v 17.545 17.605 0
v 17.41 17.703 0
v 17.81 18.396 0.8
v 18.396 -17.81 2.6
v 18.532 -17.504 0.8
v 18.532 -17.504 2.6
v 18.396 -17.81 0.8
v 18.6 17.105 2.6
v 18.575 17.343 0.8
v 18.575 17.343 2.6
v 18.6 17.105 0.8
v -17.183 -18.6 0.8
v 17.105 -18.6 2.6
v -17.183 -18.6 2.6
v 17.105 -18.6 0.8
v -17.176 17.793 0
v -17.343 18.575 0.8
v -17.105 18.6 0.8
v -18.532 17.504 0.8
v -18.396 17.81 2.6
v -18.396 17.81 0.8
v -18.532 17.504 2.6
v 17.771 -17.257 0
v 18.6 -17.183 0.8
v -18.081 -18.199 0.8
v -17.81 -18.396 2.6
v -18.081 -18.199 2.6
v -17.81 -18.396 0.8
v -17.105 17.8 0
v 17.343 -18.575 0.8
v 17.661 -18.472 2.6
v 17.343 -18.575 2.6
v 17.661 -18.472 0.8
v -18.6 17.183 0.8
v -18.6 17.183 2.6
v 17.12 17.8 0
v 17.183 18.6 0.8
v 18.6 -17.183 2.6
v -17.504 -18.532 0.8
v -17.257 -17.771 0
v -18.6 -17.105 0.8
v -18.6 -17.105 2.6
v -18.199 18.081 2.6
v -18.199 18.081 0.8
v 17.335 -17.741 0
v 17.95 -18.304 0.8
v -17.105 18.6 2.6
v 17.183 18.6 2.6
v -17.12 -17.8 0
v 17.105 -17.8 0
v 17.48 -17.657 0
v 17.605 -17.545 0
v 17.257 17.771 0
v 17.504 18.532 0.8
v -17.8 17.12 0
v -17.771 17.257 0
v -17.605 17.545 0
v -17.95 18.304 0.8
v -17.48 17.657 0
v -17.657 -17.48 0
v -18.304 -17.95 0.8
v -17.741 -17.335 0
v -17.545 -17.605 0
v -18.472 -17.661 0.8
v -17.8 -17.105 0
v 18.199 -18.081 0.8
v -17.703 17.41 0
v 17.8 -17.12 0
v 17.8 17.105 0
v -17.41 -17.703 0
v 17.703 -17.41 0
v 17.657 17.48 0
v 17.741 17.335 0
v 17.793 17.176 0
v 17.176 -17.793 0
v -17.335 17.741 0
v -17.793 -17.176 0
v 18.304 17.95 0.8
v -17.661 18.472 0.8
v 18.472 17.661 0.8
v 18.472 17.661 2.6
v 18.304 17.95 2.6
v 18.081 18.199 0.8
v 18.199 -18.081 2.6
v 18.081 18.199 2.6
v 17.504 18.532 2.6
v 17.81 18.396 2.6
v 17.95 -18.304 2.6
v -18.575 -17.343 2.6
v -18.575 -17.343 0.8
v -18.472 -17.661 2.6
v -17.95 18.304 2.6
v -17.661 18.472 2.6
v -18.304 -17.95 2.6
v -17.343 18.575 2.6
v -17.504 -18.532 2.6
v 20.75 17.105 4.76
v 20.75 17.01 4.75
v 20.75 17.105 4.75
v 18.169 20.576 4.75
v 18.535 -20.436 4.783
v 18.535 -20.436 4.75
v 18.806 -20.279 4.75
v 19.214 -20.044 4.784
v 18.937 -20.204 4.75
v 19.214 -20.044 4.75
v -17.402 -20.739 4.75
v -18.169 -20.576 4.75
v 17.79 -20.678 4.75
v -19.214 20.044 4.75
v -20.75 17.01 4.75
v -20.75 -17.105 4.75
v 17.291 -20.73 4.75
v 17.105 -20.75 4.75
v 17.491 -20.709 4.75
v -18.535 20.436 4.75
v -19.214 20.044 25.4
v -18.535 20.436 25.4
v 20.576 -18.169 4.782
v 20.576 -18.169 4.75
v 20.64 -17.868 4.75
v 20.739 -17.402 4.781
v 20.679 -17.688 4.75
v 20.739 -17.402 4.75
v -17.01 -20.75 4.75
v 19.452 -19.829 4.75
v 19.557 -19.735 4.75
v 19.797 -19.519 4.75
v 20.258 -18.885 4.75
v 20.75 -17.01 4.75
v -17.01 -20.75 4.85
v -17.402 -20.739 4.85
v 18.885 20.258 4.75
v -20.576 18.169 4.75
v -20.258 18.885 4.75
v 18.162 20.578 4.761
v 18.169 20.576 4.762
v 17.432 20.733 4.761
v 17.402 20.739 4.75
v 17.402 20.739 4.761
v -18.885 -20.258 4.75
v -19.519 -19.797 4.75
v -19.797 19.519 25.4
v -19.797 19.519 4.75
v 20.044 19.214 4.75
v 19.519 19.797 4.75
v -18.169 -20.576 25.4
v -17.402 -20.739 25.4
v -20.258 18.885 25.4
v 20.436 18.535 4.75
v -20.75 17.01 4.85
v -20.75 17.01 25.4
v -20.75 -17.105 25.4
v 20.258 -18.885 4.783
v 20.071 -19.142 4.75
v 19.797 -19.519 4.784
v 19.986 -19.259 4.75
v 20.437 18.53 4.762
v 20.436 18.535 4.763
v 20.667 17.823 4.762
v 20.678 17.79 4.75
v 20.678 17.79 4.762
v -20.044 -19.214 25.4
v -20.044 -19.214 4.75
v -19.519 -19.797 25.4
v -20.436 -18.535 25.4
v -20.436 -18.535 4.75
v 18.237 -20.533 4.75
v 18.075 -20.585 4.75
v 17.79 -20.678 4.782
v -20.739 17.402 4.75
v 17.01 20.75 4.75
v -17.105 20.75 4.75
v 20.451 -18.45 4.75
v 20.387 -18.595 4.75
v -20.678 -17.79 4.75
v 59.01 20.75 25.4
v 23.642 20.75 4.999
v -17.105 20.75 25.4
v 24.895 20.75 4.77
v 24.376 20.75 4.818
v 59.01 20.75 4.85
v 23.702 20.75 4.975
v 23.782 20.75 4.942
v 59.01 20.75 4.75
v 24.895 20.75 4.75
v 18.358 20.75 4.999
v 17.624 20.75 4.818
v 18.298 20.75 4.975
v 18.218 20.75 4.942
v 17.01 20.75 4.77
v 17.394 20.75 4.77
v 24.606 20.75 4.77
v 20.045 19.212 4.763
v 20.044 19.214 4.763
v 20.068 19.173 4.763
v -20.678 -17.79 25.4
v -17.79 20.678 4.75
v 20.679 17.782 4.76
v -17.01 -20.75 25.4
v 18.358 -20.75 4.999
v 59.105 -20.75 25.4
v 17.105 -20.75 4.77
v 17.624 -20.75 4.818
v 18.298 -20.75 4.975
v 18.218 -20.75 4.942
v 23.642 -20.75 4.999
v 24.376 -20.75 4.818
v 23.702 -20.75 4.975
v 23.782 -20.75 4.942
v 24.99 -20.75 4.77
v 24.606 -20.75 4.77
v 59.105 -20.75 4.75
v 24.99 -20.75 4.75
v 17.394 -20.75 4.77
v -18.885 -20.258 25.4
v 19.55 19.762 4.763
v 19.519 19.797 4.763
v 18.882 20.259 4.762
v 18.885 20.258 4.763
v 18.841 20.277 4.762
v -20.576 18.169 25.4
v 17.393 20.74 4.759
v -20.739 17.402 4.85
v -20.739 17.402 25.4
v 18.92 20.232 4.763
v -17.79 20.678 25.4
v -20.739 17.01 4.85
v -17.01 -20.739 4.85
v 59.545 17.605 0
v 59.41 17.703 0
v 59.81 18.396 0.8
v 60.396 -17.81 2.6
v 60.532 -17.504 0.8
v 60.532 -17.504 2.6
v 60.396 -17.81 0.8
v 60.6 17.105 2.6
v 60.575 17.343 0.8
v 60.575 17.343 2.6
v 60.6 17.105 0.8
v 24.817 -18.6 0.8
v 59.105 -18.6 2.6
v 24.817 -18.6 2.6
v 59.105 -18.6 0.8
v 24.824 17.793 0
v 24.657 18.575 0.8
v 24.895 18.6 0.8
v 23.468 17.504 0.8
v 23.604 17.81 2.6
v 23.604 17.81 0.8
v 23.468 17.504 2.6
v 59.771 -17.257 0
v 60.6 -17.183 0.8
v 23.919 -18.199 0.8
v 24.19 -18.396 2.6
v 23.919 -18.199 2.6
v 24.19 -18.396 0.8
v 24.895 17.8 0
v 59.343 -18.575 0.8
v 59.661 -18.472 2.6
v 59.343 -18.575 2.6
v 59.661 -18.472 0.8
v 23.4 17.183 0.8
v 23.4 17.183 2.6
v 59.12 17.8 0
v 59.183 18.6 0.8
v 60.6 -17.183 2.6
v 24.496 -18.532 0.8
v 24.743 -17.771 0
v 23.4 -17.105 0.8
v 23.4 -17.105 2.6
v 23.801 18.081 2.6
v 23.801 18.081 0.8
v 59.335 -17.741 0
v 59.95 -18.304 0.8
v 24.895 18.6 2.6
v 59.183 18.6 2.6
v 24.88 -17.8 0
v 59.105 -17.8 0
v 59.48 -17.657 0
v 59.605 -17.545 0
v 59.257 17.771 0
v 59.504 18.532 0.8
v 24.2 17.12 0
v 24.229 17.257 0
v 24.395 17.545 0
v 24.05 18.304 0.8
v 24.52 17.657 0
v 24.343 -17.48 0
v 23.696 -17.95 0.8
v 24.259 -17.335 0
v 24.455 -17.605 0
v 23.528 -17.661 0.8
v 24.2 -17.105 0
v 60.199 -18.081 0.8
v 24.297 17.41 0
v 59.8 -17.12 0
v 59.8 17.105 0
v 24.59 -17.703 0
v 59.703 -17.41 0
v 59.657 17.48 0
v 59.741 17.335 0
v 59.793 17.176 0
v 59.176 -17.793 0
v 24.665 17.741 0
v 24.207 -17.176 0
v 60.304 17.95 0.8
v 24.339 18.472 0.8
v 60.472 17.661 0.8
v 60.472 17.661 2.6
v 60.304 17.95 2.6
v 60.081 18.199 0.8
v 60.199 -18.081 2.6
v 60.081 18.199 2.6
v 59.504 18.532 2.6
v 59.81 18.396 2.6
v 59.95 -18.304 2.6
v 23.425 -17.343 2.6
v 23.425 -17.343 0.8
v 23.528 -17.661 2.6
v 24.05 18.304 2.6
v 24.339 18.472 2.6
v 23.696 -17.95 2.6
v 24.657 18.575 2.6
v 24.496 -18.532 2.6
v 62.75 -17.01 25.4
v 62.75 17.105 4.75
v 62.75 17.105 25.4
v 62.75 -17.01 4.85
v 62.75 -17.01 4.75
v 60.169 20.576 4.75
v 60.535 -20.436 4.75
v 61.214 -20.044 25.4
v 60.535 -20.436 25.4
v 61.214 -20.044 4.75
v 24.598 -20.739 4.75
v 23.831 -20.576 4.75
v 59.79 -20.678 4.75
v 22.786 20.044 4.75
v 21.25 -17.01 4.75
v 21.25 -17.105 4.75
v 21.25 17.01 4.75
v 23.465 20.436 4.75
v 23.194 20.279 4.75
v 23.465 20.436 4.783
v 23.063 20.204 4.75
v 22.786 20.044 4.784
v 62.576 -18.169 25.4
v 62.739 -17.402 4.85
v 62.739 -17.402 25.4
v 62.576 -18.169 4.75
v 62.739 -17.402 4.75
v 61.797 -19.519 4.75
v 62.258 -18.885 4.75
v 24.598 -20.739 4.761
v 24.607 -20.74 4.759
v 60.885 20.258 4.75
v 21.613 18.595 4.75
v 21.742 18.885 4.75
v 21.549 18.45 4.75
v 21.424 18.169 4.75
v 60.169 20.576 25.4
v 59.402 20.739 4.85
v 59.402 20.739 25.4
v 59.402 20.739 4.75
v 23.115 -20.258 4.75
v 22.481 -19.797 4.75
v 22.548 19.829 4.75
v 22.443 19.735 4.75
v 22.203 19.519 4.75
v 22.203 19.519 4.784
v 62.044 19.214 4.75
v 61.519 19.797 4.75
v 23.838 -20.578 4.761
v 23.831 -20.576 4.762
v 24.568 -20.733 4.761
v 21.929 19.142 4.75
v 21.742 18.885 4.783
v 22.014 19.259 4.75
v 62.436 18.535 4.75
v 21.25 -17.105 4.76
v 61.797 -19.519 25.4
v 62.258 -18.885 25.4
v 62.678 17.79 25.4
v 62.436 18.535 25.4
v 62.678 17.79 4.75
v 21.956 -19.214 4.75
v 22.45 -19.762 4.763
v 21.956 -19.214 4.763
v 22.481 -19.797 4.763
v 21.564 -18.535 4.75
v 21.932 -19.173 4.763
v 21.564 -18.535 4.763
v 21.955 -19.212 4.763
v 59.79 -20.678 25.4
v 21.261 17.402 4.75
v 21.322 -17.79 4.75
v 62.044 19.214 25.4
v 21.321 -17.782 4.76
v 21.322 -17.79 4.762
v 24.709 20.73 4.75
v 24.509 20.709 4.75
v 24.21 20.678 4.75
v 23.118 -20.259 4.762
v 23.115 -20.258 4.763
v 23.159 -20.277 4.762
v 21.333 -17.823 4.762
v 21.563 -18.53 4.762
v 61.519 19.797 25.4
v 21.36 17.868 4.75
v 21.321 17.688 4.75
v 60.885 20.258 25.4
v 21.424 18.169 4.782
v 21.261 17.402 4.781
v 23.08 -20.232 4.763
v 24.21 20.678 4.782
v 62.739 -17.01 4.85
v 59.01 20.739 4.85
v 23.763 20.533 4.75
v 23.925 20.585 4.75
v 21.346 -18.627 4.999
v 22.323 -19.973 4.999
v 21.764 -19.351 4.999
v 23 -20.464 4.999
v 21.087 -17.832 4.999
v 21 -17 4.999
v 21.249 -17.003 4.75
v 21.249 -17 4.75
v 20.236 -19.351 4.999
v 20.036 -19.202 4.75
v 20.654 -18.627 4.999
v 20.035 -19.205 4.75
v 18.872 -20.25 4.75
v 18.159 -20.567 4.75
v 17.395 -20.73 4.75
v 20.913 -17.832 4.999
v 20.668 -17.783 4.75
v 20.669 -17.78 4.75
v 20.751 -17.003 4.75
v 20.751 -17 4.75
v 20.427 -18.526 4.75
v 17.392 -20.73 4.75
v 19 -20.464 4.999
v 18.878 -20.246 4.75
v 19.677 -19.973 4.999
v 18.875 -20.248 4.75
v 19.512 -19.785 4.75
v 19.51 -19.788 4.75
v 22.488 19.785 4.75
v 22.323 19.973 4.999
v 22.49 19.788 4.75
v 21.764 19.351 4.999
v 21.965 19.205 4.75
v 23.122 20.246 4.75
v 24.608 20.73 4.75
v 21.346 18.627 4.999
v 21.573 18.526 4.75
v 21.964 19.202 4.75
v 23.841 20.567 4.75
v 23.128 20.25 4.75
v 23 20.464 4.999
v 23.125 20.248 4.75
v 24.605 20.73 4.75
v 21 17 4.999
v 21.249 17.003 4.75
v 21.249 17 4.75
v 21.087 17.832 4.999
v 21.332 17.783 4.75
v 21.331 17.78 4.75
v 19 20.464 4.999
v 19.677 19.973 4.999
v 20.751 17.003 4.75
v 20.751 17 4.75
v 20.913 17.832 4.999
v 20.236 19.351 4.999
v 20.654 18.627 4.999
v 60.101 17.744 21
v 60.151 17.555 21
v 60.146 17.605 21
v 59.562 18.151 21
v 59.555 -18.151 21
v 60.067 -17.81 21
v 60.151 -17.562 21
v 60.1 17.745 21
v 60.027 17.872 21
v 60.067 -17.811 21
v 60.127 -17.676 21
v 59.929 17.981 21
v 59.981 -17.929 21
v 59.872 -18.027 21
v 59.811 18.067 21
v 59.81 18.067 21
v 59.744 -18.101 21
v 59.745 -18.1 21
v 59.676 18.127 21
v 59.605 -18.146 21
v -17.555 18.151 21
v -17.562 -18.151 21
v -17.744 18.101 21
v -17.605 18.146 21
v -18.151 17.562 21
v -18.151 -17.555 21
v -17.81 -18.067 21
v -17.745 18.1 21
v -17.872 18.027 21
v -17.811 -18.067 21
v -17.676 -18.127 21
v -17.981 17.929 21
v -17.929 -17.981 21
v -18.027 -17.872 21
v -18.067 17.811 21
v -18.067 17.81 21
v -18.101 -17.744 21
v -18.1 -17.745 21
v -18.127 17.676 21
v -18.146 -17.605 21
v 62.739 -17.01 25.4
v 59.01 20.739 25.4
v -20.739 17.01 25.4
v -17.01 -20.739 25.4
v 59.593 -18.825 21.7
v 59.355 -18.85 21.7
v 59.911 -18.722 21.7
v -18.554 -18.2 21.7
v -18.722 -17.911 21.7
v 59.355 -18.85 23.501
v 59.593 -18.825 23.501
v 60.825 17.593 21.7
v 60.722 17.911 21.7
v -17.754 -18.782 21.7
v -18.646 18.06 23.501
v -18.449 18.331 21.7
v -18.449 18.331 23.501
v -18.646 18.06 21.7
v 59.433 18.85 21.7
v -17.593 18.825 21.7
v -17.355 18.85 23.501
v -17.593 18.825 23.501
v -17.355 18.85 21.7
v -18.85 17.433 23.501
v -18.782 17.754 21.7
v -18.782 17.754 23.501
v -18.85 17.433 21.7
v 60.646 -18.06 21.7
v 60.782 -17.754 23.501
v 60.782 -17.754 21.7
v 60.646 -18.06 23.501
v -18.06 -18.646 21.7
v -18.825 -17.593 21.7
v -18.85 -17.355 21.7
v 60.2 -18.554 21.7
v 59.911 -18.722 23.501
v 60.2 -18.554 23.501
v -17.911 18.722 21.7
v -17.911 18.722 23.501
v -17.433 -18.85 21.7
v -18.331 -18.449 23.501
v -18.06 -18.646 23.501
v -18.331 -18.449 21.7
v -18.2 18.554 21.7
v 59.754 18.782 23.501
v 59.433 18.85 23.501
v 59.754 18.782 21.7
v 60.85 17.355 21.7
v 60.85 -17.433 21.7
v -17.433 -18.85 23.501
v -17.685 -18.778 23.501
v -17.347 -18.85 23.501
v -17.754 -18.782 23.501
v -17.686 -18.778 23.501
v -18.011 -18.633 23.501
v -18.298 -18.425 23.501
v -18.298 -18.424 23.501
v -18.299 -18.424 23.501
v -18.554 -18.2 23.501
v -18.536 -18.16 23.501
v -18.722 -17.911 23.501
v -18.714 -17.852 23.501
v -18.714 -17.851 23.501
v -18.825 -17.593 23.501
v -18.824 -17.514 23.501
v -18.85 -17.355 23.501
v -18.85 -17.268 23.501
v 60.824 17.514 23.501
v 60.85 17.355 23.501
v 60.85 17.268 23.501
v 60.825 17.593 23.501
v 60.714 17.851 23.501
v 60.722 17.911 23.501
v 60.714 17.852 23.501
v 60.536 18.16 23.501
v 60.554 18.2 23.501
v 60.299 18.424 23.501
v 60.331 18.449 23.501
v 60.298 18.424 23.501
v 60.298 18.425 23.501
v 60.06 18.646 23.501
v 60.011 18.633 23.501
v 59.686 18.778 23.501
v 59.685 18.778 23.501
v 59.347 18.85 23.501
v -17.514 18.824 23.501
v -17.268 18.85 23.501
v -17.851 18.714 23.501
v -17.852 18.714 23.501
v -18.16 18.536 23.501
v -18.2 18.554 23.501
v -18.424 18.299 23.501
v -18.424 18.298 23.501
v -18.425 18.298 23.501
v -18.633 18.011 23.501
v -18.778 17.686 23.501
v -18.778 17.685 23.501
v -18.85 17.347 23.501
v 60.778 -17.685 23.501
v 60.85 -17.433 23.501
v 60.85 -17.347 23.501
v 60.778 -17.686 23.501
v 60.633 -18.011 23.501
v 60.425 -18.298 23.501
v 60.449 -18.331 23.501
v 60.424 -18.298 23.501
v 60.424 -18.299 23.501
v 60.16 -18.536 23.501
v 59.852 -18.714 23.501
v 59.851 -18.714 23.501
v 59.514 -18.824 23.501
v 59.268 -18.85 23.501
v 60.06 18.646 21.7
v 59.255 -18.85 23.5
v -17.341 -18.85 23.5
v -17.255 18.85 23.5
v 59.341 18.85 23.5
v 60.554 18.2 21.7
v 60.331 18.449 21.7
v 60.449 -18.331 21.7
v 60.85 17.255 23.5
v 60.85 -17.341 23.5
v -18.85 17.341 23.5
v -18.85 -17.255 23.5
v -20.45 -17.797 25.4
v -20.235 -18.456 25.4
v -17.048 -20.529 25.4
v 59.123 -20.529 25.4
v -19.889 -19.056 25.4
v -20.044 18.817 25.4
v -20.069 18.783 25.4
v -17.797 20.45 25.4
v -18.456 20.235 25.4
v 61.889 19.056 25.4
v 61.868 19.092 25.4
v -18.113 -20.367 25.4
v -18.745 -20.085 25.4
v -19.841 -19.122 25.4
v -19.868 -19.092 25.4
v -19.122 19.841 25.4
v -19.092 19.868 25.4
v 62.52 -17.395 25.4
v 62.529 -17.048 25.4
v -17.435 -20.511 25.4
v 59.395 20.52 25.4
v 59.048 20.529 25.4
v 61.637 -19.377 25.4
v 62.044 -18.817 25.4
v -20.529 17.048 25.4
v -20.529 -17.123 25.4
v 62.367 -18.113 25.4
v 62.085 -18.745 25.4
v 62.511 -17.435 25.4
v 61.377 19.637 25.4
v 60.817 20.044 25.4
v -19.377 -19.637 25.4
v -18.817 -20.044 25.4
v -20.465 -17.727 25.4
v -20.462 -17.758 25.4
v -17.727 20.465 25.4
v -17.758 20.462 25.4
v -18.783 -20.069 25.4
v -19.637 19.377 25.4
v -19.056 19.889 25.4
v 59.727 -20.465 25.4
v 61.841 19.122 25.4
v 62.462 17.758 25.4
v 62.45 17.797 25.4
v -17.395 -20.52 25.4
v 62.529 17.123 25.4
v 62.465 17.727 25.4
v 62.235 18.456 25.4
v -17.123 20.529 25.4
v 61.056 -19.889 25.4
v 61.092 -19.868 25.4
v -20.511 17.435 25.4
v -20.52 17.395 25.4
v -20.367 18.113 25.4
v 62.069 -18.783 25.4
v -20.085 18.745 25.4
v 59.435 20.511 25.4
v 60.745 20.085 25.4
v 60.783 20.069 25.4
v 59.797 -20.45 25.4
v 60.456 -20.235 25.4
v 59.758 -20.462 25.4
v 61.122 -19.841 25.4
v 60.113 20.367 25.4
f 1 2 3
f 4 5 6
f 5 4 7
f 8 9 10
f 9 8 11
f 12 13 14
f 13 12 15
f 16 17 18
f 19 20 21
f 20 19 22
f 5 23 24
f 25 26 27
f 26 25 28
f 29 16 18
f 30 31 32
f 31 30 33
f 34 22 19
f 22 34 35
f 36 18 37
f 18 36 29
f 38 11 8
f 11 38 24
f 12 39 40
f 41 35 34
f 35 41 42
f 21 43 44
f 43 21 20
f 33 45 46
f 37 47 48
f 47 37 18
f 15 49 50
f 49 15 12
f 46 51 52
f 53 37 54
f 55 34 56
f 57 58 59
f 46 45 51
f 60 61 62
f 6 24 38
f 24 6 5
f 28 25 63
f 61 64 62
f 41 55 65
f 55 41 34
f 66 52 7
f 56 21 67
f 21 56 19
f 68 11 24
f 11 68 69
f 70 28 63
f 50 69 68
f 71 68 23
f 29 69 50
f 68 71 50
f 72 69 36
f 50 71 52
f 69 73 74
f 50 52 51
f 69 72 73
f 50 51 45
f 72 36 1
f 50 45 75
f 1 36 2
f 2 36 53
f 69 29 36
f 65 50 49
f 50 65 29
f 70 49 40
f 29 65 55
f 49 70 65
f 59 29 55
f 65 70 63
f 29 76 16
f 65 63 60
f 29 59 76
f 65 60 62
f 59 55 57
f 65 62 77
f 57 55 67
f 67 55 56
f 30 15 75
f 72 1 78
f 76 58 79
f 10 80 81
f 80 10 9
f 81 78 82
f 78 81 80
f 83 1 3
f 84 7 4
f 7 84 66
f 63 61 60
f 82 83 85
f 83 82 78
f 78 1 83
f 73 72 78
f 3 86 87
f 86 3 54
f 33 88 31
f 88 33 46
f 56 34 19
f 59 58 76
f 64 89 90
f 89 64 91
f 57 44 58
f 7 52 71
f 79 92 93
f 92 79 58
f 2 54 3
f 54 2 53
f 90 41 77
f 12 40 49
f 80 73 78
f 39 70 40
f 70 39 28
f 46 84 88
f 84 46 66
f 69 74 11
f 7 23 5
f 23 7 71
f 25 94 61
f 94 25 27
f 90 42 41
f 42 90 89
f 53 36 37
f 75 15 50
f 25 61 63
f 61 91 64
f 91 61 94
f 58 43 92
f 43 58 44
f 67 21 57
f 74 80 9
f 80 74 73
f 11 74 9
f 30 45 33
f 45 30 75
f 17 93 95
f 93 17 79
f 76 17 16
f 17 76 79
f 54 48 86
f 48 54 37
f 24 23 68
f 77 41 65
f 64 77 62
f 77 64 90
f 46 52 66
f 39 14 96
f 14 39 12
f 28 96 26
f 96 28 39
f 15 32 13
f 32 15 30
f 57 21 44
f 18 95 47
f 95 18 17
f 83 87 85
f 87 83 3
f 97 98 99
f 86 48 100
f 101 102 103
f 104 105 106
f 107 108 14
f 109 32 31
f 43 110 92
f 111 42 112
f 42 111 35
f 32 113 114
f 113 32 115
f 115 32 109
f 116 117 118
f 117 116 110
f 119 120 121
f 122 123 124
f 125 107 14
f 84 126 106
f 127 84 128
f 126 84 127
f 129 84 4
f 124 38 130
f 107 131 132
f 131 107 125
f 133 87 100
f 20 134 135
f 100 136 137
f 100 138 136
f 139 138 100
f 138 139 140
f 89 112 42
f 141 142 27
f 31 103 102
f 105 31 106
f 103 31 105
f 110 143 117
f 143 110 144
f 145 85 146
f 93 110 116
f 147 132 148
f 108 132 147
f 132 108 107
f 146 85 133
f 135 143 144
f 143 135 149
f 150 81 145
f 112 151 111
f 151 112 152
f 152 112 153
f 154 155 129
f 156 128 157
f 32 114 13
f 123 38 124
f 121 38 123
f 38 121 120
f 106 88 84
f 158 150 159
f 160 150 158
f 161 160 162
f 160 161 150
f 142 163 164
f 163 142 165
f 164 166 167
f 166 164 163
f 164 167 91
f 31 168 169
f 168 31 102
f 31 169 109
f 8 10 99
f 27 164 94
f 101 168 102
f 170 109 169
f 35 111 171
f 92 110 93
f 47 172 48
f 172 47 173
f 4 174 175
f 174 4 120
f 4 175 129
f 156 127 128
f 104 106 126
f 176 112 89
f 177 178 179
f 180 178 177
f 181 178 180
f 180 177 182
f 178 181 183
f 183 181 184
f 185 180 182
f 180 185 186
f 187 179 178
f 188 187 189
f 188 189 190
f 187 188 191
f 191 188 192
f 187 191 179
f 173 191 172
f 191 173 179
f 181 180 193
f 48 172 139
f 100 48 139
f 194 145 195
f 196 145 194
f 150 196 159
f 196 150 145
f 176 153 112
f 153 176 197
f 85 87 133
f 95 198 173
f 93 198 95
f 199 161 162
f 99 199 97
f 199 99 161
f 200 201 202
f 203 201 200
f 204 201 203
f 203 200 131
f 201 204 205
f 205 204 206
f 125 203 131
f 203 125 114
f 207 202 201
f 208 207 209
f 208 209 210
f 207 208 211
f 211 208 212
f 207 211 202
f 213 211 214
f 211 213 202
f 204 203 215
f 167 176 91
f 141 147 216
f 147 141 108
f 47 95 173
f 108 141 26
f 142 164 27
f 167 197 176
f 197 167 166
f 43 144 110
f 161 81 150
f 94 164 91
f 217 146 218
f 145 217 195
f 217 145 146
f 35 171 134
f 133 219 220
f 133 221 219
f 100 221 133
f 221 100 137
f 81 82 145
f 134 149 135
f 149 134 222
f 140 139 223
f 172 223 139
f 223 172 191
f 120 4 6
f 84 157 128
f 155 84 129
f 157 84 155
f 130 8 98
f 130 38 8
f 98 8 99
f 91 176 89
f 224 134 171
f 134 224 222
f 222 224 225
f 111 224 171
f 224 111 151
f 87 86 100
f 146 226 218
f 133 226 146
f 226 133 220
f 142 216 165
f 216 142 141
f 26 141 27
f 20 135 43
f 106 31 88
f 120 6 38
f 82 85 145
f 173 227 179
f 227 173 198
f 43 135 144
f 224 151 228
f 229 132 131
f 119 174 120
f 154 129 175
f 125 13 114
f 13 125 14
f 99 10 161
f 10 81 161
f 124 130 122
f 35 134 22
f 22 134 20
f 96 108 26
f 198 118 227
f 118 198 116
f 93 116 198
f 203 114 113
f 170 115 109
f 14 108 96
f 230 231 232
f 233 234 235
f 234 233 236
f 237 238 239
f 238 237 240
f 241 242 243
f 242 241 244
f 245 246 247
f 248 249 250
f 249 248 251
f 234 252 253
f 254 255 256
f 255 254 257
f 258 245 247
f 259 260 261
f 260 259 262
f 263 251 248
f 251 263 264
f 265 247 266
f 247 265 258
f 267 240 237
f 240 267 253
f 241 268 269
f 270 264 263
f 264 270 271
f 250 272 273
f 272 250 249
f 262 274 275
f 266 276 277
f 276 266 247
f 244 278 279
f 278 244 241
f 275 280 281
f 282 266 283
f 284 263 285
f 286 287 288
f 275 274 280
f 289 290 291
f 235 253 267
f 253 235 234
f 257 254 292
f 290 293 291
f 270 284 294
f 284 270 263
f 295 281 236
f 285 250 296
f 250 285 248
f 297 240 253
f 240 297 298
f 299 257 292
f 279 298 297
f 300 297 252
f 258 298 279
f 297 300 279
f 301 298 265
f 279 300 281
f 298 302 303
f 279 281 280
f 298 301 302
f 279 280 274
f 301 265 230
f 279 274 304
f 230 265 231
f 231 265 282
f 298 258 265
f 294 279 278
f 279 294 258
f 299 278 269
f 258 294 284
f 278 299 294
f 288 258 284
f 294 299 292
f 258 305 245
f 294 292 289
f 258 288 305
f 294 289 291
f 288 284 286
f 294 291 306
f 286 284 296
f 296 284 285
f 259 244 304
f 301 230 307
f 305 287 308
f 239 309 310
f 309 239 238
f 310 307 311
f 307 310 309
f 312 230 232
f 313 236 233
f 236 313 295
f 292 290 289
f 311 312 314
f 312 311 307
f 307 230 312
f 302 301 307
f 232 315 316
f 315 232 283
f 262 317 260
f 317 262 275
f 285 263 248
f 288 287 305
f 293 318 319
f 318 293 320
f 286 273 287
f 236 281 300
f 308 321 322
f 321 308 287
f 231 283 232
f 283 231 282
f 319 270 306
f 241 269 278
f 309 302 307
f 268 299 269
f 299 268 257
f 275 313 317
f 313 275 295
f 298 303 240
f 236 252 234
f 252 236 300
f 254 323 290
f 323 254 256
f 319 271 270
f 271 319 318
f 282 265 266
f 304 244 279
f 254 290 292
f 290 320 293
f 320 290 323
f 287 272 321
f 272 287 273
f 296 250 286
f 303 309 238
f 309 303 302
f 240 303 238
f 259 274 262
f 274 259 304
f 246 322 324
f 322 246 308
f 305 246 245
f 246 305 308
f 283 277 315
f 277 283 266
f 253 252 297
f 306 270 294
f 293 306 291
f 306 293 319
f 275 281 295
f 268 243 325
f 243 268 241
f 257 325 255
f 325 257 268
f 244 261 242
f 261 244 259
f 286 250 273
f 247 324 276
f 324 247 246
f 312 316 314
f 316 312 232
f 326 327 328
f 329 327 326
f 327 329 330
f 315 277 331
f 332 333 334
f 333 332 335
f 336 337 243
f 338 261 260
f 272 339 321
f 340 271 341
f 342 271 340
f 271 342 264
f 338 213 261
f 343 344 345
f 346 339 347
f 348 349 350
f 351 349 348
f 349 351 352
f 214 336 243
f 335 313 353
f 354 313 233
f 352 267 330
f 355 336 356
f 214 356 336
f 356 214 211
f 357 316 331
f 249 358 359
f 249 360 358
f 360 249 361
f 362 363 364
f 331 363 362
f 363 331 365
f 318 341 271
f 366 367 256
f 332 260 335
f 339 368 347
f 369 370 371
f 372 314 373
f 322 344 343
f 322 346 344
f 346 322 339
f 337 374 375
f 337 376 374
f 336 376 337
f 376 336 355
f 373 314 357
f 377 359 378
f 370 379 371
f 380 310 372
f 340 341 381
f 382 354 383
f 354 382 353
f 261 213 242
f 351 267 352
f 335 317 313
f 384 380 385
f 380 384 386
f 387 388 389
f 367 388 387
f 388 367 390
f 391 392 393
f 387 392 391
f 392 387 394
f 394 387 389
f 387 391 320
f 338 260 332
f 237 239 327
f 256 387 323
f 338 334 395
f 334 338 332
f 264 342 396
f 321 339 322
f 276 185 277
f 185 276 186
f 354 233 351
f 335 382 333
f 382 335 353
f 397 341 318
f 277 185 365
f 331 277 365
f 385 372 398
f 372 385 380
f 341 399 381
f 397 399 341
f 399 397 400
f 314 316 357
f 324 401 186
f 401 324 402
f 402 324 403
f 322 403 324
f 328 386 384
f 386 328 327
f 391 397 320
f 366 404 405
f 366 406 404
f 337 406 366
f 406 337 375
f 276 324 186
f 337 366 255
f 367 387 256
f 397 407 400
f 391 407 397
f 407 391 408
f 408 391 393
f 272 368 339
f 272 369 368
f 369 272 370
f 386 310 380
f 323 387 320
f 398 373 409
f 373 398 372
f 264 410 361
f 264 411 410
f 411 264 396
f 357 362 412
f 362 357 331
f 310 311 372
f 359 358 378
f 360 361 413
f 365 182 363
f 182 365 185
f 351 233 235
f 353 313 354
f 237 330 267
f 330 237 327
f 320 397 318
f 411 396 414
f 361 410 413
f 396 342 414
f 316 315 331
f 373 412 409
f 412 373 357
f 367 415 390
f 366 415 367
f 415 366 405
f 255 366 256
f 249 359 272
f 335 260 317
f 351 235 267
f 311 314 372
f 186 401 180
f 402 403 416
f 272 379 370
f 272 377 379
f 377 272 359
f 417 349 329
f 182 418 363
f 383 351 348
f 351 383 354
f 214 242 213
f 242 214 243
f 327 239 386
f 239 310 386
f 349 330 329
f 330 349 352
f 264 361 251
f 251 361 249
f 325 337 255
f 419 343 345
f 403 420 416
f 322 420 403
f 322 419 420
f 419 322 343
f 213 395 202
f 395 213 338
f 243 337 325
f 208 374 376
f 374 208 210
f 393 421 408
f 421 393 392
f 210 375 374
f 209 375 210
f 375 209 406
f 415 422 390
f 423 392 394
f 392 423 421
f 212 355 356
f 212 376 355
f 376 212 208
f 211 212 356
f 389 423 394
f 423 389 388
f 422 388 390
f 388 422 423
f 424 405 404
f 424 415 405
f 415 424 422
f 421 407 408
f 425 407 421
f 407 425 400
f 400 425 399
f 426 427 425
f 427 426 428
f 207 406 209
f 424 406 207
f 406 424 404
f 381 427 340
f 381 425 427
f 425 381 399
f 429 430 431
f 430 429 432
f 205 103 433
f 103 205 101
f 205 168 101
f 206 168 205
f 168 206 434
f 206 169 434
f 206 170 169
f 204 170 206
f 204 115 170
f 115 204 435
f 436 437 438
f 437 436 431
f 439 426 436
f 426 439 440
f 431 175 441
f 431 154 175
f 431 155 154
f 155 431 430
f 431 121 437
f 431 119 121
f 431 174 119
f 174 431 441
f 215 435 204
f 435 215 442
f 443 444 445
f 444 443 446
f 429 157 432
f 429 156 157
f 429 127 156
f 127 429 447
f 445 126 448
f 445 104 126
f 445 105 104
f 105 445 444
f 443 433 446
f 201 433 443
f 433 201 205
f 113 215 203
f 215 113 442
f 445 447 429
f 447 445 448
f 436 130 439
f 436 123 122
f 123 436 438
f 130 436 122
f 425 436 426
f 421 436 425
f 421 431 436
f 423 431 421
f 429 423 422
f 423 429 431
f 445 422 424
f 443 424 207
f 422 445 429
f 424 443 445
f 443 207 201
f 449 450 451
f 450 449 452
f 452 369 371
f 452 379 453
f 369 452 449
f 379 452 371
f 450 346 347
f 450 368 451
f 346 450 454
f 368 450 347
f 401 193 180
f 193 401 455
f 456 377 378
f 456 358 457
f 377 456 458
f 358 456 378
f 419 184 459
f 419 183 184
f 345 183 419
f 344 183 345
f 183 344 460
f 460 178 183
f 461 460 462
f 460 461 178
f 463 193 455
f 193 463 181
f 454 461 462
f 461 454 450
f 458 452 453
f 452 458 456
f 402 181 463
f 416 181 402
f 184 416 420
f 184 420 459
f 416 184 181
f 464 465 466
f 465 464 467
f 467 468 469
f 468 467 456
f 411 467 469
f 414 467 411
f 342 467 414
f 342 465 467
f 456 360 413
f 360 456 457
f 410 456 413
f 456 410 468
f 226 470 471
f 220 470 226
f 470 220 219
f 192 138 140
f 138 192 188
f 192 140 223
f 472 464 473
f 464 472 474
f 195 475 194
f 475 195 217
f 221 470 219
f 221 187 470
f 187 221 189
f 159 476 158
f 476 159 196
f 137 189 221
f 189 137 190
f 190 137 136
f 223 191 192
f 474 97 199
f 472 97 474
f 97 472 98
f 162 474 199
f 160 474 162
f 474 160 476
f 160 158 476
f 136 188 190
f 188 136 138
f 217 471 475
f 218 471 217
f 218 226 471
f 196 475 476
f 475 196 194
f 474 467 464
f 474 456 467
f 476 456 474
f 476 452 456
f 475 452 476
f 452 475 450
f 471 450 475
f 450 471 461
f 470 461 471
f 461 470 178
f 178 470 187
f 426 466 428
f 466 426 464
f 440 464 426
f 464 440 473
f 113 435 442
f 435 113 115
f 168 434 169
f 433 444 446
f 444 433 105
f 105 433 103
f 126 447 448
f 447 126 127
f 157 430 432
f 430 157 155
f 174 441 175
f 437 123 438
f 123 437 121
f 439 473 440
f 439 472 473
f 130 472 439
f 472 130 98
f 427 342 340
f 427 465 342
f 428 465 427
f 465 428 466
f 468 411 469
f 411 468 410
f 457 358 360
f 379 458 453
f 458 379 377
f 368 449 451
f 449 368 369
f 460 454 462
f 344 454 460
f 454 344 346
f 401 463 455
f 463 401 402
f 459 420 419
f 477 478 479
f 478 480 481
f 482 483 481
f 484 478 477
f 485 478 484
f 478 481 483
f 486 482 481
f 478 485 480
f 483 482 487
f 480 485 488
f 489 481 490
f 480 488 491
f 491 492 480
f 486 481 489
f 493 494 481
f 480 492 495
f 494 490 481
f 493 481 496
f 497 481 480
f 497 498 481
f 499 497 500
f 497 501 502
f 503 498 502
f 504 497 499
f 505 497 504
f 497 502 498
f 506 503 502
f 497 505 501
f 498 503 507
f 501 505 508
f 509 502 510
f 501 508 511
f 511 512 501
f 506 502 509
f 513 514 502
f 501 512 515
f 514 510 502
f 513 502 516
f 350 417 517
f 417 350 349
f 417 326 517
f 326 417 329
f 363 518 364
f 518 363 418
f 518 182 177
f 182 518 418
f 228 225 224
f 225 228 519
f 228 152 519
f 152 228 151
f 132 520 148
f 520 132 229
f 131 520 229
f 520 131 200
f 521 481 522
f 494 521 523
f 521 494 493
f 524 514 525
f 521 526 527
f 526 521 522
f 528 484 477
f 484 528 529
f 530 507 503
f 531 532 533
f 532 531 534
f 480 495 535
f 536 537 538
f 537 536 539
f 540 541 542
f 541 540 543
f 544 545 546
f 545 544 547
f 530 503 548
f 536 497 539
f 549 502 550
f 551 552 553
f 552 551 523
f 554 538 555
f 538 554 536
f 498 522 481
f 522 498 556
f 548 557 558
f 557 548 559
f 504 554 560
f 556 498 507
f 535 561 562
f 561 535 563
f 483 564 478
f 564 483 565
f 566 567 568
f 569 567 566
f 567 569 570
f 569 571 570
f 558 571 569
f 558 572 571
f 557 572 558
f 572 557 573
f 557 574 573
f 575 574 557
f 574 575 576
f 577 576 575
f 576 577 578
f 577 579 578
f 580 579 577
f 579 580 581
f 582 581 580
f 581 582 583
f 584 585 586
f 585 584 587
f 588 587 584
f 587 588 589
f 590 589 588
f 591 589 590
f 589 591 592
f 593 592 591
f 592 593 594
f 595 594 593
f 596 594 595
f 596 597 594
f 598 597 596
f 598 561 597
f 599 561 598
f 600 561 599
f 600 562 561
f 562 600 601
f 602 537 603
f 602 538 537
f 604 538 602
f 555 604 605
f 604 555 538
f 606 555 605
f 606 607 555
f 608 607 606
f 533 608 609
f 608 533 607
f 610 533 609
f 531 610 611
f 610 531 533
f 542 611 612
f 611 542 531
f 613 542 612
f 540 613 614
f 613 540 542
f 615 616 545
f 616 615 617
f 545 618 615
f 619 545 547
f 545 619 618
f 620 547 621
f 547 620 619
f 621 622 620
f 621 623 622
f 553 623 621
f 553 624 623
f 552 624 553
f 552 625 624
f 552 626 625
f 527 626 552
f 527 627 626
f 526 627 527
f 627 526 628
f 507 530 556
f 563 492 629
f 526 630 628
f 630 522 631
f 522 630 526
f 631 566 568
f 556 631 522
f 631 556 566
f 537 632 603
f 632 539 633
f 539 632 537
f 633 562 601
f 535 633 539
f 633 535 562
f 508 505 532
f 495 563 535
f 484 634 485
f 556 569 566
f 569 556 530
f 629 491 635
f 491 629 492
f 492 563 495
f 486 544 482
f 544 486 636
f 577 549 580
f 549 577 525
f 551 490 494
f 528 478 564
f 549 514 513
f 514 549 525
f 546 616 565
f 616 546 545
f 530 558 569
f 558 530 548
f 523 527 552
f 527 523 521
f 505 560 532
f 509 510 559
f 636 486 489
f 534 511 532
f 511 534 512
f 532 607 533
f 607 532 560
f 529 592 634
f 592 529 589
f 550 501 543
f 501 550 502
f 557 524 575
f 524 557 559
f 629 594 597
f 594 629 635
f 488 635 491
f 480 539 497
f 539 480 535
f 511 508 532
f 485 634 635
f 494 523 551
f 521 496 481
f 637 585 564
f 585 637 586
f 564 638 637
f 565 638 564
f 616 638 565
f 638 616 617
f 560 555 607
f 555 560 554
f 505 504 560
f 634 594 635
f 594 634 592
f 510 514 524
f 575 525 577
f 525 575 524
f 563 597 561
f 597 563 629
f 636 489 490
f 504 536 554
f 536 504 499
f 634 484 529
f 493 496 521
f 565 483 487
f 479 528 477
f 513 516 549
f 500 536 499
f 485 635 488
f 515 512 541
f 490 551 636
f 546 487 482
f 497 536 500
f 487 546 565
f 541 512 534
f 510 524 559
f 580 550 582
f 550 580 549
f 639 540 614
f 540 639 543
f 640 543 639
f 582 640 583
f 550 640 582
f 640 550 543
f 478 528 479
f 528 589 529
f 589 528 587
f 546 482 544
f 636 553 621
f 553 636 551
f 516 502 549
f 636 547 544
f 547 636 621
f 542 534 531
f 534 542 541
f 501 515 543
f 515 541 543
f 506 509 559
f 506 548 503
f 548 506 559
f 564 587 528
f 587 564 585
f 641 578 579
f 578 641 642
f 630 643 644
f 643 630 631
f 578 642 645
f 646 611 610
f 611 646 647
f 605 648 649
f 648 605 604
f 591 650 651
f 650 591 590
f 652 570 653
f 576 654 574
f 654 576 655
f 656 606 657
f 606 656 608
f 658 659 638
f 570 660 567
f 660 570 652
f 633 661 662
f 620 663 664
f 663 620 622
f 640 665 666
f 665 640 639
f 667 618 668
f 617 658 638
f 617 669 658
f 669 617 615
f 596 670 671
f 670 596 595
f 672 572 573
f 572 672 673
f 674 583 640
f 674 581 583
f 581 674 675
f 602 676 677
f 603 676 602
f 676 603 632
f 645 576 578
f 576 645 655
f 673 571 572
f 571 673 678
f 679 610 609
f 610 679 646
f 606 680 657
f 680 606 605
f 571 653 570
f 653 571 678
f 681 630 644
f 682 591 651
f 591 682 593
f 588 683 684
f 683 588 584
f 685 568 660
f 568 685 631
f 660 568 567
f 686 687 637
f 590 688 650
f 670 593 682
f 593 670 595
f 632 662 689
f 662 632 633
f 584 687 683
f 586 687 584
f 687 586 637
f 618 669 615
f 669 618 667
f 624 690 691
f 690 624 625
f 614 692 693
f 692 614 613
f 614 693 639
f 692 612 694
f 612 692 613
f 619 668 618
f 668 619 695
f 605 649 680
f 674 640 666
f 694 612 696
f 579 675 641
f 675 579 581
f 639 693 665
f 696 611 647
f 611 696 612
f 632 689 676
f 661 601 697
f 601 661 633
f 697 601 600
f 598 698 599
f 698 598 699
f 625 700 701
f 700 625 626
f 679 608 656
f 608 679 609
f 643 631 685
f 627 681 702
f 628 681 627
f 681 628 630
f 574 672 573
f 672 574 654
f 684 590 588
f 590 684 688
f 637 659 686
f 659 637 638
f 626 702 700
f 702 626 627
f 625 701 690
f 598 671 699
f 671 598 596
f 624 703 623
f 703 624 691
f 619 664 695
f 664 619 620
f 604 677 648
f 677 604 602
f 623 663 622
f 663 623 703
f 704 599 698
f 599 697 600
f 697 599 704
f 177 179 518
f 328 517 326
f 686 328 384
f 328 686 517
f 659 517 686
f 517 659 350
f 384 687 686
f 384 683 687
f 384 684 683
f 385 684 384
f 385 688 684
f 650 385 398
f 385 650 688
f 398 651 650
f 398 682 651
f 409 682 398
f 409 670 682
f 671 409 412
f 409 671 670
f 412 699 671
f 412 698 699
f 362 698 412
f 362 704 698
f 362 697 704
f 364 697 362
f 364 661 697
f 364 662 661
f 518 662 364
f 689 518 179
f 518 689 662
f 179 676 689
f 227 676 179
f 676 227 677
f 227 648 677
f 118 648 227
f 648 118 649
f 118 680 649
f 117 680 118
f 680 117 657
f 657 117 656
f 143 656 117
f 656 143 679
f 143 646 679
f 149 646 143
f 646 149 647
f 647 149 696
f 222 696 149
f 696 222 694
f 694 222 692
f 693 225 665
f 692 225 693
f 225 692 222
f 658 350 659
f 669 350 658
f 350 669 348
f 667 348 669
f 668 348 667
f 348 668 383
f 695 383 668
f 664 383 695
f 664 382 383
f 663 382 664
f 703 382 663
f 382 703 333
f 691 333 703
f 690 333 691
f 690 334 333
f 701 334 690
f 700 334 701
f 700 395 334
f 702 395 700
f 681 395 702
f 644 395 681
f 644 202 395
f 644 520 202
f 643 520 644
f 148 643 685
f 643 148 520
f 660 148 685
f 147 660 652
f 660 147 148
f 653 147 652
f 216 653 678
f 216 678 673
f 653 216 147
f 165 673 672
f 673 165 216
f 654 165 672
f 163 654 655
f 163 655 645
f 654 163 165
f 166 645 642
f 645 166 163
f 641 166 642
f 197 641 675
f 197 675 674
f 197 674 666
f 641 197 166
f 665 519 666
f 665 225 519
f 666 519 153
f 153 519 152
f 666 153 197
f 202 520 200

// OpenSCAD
// file: gridfinity.scad
$fn = 30;

// https://gridfinity.xyz/specification/

height   = 7;
width    = 42;
width_tolerance    = 41.5;
rounding = 3.75;

module rounding(r,angle) {
  rotate(angle,[0,0,1])
  translate([-r + 0.01, -r + 0.01])
  difference() {
    square([r,r]);
    circle(r);
  }
}

module rounded_square(lx, ly, r) {
  difference() {
    square([lx,ly],center=true);
    union() {
      translate([ lx/2, ly/2]) rounding(r, 0  );
      translate([-lx/2, ly/2]) rounding(r, 90 );
      translate([-lx/2,-ly/2]) rounding(r, 180);
      translate([ lx/2,-ly/2]) rounding(r, 270);
    }
  }
}

module magnet_hole(h = 0) {
  linear_extrude(2.5) circle(3.25);
  translate([0,0,2.5]) linear_extrude(h) circle(1.5);
}

module base_solid() {
  hull() {
    linear_extrude(0.1)rounded_square(35.6, 35.6, 0.8);
    translate([0,0,0.8]) linear_extrude(1.8) rounded_square(37.2, 37.2, 1.6);
  }
  translate([0,0,2.6]) hull() {
    linear_extrude(0.1) rounded_square(37.2, 37.2, 1.6);
    translate([0,0,2.15]) linear_extrude(0.1)rounded_square(41.5, 41.5, 3.75);
  }
}

module base(magnets = false) {
  l = 35.6;
  o = 4.8;

  difference() {
    base_solid();
    if (magnets) union() {
      translate([ l/2 - o,  l/2 - o, -0.01]) magnet_hole();
      translate([-l/2 + o,  l/2 - o, -0.01]) magnet_hole();
      translate([ l/2 - o, -l/2 + o, -0.01]) magnet_hole();
      translate([-l/2 + o, -l/2 + o, -0.01]) magnet_hole();
    }
  }
}

module stacking_lip_negative(ux, uy) {
  x1 = (width * ux) -5.2 -0.5;
  y1 = (width * uy) -5.2 -0.5;
  x2 = (width * ux) -3.8 -0.5;
  y2 = (width * uy) -3.8 -0.5;
  x3 = (width * ux) -0.5;
  y3 = (width * uy) -0.5;

  // translate and scale are here to make sure the negative pokes through
  // the positive block
  translate([0,0,-0.001]) scale([1,1,1.001]) hull() {
    linear_extrude(0.01)rounded_square(x1, y1, 0.7);
    translate([0,0,0.7]) linear_extrude(1.8) rounded_square(x2, y2, 1.6);
  }
  translate([0,0,2.5]) hull() {
    linear_extrude(0.01) rounded_square(x2, y2, 1.7);
    translate([0,0,2.15]) linear_extrude(0.01)rounded_square(x3, y3, 3.75);
  }
}

function coord_centered(ux) = (ux -1) * width - 0.5 * width * (ux - 1);

module stacking_lip(units_x, units_y) {
  difference() {
    linear_extrude(4.4)rounded_square(units_x * width -0.5, units_y * width -0.5, rounding);
    stacking_lip_negative(units_x, units_y);
  }
}

module cutout_slot(l, rx = 0) {
  rotate([rx,-90,0]) linear_extrude(l) polygon([[0,-0.25],[0,0.25],[0.25,0]]);
}

// Cut out a cross with edges sloped like the rounded corners of the base
module cutout_cross() {
    r = rounding + 0.25;

    difference() {
      linear_extrude(0.25) square([r * 2, r * 2], center=true);
      union() {
        for(c = [[r,r], [r,-r], [-r,r], [-r,-r]]) translate(c) hull() {
          linear_extrude(0.01) circle(rounding);
          translate([0,0,0.25]) linear_extrude(0.01) circle(rounding + 0.25);
        }
      }
    }
}

module bottom_cutout(units_x, units_y) {
  if (units_y > 1) for (i = [1:units_y - 1]) {
    translate([units_x * width - width/2, i * width - width/2, 4.749])
      cutout_slot(width * units_x);
  }
  if(units_x > 1) for (i = [1:units_x - 1]) {
    translate([i * width - width/2, units_y * width - width/2, 4.749])
      cutout_slot(width * units_y, rx=90);
  }

  for (ux = [0:units_x]) {
    for (uy = [0:units_y]) {
      // we don't need the cross in the corners
      if (!( (ux == 0       && uy == 0      ) ||
             (ux == units_x && uy == units_y) ||
             (ux == 0       && uy == units_y) ||
             (ux == units_x && uy == 0      ) ))
        translate([ux * width - width/2, uy * width - width/2, 4.749]) cutout_cross();
    }
  }
}

module gridfinity(units_x, units_y, units_z, lip = true, magnets = false) {
  // Bases
  for (ux = [0:units_x -1]) {
    for (uy = [0:units_y -1]) {
      translate([ux * width, uy * width,0]) base(magnets = magnets);
    }
  }

  // Solid Block
  if (units_z > 0) {
    difference() {
      translate([coord_centered(units_x), coord_centered(units_y), 4.75]) {
        extr = units_z * height - 4.75;
        linear_extrude(extr)
          rounded_square(units_x * width - 0.5, units_y * width - 0.5, rounding);
      }
      bottom_cutout(units_x, units_y);
    }
  }

  // Stacking Lip
  if (lip && units_z > 0) // Just to safeguard. h=0 is not intended to be used with lip.
    translate([coord_centered(units_x), coord_centered(units_y), units_z * height])
      stacking_lip(units_x, units_y);
}
// main file
use <gridfinity.scad>

ux = 2;
uy = 1;
uz = 3;

magnets = false;
lip = true;

gridfinity(ux, uy, uz, lip=lip, magnets=magnets, fill = false, bottom_height = 0);
